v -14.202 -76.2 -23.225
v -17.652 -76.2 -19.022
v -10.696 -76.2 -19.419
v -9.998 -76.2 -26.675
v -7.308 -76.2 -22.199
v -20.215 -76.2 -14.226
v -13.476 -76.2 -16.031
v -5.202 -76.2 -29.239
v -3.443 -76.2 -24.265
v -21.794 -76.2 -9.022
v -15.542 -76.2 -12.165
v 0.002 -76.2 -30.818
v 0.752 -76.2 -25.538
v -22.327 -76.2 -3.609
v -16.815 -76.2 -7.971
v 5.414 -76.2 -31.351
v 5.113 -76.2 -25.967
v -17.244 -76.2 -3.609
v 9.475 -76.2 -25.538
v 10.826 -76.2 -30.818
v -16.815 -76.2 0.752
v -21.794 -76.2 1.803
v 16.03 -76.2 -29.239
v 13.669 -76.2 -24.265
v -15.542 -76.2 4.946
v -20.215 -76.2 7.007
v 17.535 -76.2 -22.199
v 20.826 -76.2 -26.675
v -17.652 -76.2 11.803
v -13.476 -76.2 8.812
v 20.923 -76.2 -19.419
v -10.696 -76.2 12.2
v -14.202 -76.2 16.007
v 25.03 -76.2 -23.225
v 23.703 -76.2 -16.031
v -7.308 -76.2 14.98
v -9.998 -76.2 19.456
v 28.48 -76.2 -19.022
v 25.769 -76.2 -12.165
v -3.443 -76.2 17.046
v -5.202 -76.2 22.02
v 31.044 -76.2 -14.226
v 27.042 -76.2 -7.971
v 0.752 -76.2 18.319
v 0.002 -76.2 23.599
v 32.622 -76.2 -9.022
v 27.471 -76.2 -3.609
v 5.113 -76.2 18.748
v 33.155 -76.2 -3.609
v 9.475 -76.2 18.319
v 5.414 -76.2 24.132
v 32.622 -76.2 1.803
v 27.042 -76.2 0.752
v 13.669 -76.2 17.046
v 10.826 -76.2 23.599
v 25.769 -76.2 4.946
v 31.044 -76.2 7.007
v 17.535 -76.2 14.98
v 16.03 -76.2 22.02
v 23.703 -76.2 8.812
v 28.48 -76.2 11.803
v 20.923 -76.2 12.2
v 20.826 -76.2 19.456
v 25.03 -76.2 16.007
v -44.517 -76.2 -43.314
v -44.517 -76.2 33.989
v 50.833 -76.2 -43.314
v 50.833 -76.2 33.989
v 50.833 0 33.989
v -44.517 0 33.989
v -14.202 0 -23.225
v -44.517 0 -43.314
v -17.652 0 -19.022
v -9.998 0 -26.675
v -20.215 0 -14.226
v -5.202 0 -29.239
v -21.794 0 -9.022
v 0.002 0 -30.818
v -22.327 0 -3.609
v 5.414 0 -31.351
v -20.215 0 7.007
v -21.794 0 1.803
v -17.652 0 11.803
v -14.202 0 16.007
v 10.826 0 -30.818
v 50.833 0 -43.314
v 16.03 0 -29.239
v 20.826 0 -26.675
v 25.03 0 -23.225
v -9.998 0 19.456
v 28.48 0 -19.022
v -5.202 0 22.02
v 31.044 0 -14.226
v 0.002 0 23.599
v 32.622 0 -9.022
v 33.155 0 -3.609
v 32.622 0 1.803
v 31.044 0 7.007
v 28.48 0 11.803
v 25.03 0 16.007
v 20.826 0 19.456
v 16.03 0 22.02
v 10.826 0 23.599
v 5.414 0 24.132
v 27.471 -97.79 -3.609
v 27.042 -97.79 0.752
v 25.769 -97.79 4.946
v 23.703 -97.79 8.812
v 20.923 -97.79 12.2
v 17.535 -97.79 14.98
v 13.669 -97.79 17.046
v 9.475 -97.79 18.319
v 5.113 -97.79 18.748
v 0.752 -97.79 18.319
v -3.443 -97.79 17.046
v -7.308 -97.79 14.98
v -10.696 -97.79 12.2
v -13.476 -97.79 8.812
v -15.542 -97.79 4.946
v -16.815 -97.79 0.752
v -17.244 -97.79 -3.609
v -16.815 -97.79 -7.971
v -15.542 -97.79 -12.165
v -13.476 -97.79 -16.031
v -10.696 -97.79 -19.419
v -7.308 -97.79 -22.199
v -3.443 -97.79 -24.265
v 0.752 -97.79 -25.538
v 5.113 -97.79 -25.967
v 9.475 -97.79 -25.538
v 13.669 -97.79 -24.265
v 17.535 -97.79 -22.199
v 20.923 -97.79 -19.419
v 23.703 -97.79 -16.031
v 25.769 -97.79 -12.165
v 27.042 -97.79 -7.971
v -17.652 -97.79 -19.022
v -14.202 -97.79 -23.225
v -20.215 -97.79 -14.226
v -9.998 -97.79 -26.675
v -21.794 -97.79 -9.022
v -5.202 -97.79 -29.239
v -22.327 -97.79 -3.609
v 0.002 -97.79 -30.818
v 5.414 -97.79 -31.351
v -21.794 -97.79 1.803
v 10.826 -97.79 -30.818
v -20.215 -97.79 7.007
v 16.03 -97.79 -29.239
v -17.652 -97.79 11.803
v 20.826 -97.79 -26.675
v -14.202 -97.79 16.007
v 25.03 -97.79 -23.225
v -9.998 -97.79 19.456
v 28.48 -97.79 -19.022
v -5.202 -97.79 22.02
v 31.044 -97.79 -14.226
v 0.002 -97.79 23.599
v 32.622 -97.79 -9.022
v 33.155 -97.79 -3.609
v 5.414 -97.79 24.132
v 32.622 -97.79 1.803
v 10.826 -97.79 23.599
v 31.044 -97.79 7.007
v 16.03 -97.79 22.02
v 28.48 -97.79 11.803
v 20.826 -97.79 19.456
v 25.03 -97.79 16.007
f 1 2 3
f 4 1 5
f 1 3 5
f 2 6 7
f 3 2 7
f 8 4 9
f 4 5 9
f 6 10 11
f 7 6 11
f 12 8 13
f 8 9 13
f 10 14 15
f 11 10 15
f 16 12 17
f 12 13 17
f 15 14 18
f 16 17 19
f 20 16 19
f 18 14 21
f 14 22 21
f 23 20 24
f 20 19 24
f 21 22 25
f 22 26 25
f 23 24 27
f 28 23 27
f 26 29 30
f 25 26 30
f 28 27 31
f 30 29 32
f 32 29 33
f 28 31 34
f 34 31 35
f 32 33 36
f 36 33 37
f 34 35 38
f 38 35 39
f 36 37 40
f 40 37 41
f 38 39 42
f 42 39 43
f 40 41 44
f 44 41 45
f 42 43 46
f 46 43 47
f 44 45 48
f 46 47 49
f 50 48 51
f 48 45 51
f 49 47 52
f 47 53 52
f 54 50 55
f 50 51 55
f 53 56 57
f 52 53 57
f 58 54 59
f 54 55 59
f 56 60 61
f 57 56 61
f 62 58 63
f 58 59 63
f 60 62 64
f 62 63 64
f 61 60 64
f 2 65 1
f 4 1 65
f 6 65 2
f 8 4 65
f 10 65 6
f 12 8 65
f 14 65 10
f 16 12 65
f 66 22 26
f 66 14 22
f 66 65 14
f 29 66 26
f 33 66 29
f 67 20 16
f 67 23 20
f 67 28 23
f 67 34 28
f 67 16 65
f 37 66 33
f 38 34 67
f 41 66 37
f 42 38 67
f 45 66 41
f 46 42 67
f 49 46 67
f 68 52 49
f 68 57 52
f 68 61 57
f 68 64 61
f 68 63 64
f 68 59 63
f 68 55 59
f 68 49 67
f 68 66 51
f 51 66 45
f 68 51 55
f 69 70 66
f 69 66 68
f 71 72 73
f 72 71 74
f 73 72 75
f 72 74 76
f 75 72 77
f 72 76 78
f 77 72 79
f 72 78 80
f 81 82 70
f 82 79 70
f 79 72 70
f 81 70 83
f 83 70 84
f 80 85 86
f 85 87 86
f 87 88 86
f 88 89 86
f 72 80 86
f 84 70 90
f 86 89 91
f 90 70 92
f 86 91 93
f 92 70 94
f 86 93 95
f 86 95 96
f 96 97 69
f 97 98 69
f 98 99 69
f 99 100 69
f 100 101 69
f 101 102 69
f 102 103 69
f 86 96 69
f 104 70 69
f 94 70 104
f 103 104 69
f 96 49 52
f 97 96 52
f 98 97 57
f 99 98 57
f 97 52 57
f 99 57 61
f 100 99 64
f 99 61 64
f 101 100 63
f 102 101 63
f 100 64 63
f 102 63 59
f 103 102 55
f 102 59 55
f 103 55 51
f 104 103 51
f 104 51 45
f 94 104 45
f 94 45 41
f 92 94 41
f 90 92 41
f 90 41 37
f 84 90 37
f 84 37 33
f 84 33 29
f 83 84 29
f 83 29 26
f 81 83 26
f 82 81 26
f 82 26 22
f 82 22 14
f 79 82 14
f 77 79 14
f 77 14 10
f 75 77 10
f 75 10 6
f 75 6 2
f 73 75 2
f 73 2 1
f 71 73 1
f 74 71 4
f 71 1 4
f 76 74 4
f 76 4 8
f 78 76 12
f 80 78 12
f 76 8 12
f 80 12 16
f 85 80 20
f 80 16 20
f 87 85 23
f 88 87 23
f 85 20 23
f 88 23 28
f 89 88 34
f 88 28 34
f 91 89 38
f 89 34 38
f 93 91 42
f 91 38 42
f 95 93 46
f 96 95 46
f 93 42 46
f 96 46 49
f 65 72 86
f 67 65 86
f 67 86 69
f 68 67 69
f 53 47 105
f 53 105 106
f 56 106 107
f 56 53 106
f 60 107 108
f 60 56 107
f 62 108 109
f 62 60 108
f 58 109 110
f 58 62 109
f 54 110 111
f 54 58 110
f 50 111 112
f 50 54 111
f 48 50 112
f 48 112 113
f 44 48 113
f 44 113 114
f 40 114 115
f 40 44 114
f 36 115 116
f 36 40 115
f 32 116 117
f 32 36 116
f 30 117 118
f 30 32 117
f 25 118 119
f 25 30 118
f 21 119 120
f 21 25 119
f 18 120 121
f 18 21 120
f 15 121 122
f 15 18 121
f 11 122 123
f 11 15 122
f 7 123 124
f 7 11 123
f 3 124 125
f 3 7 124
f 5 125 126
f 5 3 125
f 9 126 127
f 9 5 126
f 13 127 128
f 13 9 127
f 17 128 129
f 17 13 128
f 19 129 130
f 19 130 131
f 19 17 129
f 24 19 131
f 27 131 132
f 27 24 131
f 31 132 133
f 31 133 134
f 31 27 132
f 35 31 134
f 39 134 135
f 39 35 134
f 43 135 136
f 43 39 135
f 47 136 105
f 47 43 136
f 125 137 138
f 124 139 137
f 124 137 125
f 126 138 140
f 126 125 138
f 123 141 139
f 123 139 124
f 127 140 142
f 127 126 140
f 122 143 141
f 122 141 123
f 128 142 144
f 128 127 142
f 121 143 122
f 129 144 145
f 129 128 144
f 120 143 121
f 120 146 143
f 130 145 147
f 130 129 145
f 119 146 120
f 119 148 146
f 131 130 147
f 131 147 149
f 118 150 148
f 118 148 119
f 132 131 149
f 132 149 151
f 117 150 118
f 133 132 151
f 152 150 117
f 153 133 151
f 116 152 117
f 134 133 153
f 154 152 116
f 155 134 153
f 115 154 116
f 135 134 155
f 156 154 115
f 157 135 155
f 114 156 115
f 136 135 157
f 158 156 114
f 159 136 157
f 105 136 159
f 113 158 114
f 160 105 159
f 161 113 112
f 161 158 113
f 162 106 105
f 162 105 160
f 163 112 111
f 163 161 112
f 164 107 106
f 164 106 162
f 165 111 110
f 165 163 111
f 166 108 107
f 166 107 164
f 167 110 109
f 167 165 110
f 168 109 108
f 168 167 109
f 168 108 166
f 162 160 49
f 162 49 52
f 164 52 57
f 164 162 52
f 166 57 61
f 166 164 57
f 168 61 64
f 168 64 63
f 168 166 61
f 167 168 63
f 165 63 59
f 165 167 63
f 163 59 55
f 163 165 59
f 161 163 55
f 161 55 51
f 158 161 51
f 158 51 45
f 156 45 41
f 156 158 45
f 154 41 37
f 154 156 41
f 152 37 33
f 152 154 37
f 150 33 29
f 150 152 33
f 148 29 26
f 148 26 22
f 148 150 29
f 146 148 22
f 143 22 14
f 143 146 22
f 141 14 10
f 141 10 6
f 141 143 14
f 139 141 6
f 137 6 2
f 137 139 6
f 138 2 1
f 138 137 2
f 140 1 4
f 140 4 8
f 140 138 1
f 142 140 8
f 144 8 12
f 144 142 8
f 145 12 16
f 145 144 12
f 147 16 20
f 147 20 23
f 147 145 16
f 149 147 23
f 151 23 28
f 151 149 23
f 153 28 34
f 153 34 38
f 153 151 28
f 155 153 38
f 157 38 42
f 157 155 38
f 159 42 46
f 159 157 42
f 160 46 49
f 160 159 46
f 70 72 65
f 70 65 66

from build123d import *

# Parameters (mm, degrees)
F0_W     = 95.350262
F0_H     = 77.302896
F1_DEPTH = 76.2
F3_R     = 27.741206
F3_R_2   = 22.357784
F4_DEPTH = 21.59
F2_R     = 27.741206
F5_DEPTH = 76.201


with BuildPart() as f1:
    # F0 (on Front) → F1 (new body)
    with BuildSketch(Plane.XZ):
        with Locations((3.158288, -4.662238)):
            Rectangle(F0_W, F0_H)
    extrude(amount=F1_DEPTH)

    # F3 (on face) → F4 (join, symmetric)
    with BuildSketch(Plane.XZ.offset(76.2)):
        with Locations((5.414211, -3.609474)):
            Circle(F3_R)
        with Locations((5.113423, -3.609474)):
            Circle(F3_R_2, mode=Mode.SUBTRACT)
    extrude(amount=F4_DEPTH, both=True)

    # F2 (on face) → F5 (cut, through all)
    with BuildSketch(Plane.XZ.offset(76.2)):
        with Locations((5.414211, -3.609474)):
            Circle(F2_R)
    extrude(amount=-F5_DEPTH, mode=Mode.SUBTRACT)


solid = f1.part
